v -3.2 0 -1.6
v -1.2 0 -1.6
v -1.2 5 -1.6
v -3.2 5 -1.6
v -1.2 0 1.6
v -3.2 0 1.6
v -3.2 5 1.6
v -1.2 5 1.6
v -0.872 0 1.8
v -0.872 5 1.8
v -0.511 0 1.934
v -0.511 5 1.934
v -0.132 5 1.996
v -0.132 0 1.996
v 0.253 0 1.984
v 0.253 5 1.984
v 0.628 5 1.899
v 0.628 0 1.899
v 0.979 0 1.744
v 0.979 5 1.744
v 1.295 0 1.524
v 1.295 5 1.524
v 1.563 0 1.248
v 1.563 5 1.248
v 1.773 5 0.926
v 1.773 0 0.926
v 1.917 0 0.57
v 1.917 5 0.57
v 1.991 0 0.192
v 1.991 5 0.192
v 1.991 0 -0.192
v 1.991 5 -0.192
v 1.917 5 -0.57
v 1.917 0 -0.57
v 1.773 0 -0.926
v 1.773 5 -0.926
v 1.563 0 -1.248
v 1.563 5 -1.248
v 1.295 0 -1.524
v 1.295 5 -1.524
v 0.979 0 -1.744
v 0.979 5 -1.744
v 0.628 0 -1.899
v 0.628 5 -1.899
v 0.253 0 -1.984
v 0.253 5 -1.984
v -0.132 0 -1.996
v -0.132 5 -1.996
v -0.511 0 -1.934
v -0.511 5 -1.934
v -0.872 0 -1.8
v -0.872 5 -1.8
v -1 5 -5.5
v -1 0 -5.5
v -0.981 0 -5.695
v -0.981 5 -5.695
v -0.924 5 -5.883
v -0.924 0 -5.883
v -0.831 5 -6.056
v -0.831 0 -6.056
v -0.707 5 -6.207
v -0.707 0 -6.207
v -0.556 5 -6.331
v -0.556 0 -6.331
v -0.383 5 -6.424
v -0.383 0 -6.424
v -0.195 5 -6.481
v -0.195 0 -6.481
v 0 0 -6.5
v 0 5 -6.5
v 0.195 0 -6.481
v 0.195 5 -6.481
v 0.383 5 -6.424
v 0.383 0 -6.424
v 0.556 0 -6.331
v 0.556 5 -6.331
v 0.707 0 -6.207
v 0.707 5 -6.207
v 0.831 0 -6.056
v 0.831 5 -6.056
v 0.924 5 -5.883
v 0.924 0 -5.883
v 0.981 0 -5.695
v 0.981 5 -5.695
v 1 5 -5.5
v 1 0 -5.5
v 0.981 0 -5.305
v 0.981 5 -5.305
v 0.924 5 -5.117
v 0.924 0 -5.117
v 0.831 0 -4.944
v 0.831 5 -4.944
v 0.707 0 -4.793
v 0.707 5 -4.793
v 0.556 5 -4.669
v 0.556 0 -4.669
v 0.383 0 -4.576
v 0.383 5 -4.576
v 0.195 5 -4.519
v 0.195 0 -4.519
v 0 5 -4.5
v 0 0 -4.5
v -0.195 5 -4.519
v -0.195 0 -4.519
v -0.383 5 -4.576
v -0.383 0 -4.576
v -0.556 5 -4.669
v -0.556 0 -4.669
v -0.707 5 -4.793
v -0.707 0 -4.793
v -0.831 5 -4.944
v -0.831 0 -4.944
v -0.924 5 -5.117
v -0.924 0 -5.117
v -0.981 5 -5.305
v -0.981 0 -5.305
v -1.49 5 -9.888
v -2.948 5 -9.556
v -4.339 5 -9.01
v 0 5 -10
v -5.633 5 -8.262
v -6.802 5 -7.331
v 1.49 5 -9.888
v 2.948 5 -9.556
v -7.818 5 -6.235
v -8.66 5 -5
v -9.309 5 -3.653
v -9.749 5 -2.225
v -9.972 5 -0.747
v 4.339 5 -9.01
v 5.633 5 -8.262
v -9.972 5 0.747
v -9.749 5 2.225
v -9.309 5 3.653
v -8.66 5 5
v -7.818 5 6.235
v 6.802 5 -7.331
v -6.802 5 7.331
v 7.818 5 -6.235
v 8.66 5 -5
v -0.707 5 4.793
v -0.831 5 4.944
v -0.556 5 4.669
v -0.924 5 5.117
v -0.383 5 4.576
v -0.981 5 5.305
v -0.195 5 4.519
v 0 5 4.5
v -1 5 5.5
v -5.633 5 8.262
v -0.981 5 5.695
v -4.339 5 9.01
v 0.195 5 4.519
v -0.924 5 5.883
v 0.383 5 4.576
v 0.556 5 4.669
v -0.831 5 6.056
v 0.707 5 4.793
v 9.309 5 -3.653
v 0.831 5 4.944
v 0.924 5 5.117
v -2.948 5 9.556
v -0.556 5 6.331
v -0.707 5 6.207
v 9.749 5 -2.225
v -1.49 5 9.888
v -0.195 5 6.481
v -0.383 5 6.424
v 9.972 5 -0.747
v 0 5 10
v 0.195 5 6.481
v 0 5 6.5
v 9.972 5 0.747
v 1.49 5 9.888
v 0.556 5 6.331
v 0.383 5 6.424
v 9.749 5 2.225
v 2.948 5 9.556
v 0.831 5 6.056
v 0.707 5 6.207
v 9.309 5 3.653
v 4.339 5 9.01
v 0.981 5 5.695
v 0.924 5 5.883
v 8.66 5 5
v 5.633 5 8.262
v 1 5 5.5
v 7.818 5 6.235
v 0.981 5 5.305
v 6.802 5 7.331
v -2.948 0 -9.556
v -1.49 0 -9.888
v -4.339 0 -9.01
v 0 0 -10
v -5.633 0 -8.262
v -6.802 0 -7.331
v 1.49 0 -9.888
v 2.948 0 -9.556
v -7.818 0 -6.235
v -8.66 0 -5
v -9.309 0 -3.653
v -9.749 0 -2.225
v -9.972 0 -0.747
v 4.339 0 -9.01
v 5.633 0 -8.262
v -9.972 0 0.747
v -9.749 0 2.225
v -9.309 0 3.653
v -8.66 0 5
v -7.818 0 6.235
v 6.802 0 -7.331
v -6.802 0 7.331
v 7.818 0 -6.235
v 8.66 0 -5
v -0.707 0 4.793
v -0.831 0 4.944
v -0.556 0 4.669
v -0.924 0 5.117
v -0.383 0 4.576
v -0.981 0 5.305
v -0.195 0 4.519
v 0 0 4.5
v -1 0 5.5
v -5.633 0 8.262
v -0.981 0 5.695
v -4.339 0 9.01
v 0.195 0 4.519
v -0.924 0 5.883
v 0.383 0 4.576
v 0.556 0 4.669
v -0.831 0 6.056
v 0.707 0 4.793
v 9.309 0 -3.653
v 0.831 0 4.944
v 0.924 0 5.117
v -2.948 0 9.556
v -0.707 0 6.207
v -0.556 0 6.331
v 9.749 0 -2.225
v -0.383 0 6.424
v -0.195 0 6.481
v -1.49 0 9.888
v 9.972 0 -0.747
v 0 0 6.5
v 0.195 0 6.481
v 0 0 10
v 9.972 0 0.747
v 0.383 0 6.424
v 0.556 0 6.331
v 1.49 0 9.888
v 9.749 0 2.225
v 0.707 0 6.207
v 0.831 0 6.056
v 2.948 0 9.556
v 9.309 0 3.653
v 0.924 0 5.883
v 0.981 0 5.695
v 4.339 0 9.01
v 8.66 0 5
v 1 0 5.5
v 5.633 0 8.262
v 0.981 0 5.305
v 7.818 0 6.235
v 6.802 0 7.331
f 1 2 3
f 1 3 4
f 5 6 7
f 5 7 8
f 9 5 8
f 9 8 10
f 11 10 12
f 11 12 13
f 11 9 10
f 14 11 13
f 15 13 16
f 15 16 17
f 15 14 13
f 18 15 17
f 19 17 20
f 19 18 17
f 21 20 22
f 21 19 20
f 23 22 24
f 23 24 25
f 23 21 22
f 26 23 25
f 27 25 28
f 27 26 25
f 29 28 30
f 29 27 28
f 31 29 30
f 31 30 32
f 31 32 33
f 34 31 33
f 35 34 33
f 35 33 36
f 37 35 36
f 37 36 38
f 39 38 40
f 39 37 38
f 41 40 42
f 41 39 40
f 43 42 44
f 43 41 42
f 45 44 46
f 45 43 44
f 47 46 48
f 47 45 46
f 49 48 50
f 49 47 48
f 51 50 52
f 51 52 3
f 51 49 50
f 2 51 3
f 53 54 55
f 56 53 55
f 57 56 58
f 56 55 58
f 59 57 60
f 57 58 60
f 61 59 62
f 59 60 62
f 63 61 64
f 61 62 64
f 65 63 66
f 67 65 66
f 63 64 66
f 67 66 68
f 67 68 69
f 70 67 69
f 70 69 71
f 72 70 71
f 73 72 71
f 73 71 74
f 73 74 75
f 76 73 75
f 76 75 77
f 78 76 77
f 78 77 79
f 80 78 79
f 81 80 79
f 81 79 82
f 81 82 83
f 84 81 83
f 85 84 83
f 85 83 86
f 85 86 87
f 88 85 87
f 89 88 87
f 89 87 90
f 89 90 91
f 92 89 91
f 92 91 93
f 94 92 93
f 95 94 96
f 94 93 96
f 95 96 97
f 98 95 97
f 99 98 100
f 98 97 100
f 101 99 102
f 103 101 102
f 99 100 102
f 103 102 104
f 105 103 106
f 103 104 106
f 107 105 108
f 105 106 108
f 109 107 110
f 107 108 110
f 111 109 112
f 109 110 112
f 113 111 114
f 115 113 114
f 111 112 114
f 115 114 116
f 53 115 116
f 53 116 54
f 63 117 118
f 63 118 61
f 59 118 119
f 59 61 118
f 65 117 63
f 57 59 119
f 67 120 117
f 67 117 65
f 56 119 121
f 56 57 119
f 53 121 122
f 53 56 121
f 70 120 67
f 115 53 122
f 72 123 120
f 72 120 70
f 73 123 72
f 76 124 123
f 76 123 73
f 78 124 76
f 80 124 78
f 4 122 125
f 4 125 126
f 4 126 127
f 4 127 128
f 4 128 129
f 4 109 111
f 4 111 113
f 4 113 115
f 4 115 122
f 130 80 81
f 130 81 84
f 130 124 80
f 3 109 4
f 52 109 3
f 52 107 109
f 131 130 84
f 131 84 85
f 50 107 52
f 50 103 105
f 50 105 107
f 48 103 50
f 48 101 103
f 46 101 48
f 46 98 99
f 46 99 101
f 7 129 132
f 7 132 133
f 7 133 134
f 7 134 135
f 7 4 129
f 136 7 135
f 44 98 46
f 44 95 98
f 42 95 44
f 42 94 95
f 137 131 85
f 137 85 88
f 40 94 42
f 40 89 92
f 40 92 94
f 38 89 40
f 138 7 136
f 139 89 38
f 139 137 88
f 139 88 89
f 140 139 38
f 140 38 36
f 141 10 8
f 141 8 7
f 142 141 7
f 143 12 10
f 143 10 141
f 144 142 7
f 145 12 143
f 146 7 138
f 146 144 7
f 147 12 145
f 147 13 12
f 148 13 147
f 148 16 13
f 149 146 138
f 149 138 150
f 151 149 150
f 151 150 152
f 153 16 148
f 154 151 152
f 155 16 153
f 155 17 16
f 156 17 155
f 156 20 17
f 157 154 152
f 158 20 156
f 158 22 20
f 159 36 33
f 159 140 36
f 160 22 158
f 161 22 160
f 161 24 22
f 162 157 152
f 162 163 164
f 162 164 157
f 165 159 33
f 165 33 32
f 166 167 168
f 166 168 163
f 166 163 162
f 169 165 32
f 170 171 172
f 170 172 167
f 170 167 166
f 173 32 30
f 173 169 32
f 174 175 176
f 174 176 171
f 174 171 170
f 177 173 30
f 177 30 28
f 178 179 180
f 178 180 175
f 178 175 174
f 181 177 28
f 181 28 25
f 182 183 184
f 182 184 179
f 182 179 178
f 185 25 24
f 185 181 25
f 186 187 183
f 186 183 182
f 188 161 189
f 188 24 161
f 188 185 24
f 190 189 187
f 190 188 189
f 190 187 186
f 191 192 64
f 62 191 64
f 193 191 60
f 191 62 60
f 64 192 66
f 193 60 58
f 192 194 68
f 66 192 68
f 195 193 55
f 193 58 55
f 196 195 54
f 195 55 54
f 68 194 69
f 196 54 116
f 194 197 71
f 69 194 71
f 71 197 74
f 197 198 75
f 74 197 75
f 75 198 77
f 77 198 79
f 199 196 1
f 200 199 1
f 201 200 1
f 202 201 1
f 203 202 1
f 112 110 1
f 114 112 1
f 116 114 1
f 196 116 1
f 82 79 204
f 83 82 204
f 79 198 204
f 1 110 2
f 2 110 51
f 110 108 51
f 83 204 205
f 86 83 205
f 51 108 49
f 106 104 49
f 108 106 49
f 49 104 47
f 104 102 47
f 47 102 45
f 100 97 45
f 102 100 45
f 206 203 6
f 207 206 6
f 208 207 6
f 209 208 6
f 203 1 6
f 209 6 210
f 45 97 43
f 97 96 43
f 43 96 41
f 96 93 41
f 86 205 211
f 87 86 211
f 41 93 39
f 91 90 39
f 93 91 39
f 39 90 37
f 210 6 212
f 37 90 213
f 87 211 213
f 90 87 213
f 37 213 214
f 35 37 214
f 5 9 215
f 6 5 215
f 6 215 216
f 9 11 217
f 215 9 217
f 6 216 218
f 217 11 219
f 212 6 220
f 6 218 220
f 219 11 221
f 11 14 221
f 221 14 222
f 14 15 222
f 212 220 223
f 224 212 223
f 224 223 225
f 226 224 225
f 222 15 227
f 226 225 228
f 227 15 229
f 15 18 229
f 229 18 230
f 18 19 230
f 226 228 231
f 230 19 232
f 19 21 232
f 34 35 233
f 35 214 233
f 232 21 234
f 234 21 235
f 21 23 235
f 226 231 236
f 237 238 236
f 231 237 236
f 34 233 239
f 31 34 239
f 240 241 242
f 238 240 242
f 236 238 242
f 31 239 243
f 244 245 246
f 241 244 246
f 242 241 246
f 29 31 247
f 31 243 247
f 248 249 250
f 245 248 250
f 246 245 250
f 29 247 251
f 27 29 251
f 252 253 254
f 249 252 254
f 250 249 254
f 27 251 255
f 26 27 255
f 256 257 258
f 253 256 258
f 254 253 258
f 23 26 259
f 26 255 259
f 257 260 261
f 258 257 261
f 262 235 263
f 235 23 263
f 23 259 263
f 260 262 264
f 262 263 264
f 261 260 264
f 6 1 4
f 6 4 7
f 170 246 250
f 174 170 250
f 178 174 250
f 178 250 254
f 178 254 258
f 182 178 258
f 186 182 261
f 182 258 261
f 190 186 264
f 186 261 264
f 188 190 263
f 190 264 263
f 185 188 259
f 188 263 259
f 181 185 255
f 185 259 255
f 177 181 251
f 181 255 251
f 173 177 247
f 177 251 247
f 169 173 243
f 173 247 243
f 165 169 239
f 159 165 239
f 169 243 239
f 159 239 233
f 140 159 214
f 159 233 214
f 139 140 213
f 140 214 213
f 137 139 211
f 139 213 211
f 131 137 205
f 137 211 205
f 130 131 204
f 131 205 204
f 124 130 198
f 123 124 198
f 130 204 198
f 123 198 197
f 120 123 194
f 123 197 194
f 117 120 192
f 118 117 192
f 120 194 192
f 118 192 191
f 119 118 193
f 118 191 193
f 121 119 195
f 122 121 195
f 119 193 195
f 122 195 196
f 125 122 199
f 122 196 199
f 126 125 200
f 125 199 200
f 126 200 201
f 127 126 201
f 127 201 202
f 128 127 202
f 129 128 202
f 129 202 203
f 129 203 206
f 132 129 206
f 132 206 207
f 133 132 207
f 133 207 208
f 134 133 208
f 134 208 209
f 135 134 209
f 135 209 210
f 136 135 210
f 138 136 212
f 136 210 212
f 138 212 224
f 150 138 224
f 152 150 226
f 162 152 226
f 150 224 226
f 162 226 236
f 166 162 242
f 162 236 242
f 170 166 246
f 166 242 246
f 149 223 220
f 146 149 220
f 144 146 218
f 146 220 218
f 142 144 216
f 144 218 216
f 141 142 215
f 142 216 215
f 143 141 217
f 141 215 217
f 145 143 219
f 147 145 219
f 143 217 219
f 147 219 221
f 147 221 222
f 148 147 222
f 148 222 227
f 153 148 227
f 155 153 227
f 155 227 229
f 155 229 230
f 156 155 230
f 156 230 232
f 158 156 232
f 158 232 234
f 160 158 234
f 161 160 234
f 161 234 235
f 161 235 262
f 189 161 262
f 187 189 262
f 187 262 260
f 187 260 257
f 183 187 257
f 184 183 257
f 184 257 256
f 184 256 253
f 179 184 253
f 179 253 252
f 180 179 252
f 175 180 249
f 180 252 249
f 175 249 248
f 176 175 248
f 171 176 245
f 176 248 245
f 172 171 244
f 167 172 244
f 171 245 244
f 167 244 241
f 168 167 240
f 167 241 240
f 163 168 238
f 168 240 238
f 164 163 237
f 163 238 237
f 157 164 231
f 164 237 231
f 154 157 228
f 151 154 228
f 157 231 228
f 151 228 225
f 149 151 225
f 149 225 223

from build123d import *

# Parameters (mm, degrees)
SKETCH1_R        = 10
EXTRUSION1_DEPTH = 5
HOLE1_D          = 2


with BuildPart() as part:
    # Sketch1 → Extrusion1 (new body)
    with BuildSketch(Plane(origin=(0, 0, 0), x_dir=(-1, 0, 0), z_dir=(0, 1, 0))):
        with Locations(Location((0, 0, 0), (0, 0, 90))):
            Circle(SKETCH1_R)
        with BuildLine():
            ThreePointArc((1.2, 1.6), (-2, 0), (1.2, -1.6))
            Line((1.2, -1.6), (3.2, -1.6))
            Line((3.2, -1.6), (3.2, 1.6))
            Line((3.2, 1.6), (1.2, 1.6))
        make_face(mode=Mode.SUBTRACT)
    extrude(amount=EXTRUSION1_DEPTH)

    # Hole1 (through all)
    with Locations(Plane(origin=(0, 5, 0), x_dir=(1, 0, 0), z_dir=(0, 1, 0))):
        with Locations((0, -5.5), (0, 5.5)):
            Hole(HOLE1_D / 2)


solid = part.part
